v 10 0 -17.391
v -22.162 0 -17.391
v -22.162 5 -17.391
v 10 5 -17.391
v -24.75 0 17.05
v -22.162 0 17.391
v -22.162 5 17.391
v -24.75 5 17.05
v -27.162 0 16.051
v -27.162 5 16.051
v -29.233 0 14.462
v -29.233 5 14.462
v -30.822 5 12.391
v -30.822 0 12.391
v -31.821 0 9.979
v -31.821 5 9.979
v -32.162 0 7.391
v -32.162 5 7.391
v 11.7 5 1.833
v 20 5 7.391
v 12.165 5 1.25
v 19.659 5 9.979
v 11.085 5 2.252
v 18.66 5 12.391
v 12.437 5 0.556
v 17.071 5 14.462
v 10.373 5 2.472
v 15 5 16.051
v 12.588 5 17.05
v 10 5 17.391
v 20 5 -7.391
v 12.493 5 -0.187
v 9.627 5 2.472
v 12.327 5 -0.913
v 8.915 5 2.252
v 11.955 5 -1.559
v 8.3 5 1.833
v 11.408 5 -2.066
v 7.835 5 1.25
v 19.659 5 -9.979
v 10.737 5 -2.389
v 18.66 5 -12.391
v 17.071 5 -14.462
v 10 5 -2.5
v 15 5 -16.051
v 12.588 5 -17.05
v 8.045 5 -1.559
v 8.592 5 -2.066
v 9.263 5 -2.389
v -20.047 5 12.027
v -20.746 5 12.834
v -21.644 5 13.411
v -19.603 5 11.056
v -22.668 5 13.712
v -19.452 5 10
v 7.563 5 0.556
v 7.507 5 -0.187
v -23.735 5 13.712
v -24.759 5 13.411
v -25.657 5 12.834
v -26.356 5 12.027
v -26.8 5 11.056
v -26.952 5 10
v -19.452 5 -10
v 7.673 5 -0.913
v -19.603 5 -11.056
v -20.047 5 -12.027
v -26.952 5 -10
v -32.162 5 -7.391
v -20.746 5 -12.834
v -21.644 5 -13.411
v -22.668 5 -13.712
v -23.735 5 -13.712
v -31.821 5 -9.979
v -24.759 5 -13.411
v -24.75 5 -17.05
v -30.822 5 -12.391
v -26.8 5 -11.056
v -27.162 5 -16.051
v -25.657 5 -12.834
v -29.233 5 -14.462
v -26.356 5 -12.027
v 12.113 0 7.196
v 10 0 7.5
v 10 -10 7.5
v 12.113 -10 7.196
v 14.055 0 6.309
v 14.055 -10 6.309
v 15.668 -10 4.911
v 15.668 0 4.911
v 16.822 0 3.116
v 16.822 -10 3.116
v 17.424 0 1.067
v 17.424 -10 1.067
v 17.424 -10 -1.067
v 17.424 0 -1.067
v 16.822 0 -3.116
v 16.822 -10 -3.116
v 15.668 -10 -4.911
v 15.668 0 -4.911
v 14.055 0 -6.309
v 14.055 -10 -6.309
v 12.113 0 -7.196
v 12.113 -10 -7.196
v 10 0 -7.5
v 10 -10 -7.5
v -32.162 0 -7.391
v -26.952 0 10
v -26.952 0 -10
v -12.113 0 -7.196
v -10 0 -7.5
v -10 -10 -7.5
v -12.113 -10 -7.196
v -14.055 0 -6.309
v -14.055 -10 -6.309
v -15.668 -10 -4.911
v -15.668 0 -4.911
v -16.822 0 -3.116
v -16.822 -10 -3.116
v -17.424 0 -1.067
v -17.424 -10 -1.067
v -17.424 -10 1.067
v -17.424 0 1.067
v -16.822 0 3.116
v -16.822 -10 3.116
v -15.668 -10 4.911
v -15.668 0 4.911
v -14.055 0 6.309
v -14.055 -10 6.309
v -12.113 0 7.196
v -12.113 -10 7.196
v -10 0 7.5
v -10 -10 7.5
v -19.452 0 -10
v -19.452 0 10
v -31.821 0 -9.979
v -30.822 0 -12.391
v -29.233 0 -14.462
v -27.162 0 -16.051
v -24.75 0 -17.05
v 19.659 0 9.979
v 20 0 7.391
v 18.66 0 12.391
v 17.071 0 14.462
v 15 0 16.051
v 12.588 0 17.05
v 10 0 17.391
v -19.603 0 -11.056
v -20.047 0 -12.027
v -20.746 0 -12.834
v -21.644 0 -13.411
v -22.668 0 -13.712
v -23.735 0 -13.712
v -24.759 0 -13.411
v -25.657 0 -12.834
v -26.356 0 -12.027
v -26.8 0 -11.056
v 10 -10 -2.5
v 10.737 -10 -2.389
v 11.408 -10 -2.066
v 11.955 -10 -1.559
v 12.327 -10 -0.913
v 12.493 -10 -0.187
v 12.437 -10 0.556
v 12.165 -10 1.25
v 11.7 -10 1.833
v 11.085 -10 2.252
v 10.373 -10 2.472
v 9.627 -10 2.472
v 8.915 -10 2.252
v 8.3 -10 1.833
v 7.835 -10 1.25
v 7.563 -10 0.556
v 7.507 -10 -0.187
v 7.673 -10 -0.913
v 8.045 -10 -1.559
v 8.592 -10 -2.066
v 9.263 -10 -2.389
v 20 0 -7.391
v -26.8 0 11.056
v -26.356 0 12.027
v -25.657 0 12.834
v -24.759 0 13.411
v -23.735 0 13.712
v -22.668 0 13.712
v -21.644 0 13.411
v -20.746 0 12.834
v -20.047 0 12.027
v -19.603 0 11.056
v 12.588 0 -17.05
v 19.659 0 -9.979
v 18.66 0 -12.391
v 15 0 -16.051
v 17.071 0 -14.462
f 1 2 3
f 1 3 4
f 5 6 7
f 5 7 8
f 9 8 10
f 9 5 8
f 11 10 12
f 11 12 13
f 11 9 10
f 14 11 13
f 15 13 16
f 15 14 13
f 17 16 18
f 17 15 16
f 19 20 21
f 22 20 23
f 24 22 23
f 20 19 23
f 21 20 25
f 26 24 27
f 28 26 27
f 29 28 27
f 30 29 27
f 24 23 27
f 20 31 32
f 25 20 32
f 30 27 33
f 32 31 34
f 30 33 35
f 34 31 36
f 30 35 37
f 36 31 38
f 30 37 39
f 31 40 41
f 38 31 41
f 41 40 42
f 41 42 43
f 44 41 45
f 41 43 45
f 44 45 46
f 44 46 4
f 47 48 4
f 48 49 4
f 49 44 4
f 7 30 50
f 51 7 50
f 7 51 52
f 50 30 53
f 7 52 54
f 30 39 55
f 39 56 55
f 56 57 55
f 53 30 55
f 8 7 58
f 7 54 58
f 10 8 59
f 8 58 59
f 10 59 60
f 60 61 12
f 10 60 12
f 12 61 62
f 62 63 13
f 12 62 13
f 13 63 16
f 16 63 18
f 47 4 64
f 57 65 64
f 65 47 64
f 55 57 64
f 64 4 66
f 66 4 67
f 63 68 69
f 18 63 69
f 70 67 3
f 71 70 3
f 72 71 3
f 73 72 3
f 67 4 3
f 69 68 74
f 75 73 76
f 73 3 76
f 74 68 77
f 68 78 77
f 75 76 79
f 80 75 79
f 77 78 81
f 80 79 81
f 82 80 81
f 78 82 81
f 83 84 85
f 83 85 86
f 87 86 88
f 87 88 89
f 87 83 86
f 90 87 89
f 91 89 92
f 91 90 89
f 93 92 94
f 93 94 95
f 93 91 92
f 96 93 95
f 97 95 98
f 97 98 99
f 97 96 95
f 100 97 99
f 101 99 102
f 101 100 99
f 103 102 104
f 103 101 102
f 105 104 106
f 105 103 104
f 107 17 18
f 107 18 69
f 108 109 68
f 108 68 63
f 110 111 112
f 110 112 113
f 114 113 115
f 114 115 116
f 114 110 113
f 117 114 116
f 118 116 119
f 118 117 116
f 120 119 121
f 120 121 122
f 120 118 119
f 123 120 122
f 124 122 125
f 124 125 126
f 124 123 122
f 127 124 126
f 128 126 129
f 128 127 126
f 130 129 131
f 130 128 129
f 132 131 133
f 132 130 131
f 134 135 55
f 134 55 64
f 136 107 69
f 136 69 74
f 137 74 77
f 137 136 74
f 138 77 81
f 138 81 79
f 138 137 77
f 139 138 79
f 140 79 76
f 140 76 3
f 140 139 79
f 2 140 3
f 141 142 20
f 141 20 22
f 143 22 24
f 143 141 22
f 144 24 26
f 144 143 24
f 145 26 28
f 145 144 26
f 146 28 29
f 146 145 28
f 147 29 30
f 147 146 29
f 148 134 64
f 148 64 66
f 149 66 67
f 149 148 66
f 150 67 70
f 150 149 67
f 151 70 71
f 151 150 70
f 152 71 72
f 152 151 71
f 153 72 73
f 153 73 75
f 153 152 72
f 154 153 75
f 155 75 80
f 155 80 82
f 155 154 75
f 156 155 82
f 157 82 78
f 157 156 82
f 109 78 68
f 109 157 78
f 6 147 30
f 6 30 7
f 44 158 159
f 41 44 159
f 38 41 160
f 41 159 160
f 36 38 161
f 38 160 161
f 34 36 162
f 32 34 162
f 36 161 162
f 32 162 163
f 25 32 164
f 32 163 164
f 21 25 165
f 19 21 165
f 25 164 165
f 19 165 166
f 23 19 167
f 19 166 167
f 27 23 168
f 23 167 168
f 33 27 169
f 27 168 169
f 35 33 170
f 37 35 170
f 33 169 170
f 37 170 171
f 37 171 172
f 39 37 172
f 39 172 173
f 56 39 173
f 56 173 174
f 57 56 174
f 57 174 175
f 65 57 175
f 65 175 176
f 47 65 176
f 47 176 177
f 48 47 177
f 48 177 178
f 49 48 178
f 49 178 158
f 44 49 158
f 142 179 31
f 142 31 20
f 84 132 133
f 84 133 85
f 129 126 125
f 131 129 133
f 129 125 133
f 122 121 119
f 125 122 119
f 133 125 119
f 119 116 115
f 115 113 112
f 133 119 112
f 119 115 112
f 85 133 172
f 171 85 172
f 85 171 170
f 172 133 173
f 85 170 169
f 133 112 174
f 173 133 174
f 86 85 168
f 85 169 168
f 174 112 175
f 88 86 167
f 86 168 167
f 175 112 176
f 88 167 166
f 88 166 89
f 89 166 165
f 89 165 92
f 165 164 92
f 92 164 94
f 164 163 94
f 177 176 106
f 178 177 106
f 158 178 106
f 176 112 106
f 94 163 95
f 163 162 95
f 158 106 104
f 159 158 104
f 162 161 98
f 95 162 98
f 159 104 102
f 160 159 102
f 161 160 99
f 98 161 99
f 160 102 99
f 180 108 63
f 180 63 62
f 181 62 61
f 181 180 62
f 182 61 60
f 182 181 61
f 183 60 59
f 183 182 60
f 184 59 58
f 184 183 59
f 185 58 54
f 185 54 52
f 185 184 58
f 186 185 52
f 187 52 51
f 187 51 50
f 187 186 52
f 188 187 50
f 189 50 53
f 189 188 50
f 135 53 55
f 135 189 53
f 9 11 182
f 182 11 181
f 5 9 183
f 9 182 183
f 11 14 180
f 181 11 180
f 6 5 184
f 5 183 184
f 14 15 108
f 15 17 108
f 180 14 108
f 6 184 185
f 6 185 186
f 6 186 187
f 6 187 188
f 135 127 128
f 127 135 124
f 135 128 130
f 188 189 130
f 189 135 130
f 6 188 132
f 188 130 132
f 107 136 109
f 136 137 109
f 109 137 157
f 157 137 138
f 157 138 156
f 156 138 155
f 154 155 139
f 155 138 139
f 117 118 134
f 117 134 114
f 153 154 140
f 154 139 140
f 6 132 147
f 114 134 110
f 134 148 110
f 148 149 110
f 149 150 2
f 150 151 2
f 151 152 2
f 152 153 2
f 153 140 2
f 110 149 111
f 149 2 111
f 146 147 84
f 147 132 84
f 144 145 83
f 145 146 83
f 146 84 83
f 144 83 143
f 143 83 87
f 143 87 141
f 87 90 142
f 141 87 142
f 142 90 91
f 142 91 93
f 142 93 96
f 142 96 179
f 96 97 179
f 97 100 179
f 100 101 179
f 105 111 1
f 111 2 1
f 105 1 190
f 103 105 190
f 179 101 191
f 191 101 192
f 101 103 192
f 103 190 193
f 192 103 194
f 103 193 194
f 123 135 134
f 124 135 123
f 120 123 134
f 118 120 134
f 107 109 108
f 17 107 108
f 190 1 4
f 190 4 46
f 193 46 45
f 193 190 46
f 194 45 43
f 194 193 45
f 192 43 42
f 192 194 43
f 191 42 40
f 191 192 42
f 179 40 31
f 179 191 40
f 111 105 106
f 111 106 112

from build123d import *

# Parameters (mm, degrees)
BOSS_EXTRUDE1_DEPTH = 5
BOSS_EXTRUDE2_DEPTH = 10
SKETCH3_R           = 2.5
CUT_EXTRUDE1_DEPTH  = 16


with BuildPart() as part:
    # Sketch1 → Boss-Extrude1 (new body)
    with BuildSketch(Plane(origin=(0, 0, 0), x_dir=(1, 0, 0), z_dir=(0, 1, 0))):
        with BuildLine():
            ThreePointArc((-32.161548626, -7.391059627), (-29.232616438, -14.462127439), (-22.161548626, -17.391059627))
            Line((-22.161548626, -17.391059627), (10, -17.391059627))
            ThreePointArc((10, -17.391059627), (17.071067812, -14.462127439), (20, -7.391059627))
            Line((20, -7.391059627), (20, 7.391059627))
            ThreePointArc((20, 7.391059627), (17.071067812, 14.462127439), (10, 17.391059627))
            Line((10, 17.391059627), (-22.161548626, 17.391059627))
            ThreePointArc((-22.161548626, 17.391059627), (-29.232616438, 14.462127439), (-32.161548626, 7.391059627))
            Line((-32.161548626, 7.391059627), (-32.161548626, -7.391059627))
        make_face()
        with BuildLine():
            ThreePointArc((-26.951571496, 10), (-23.201571496, 13.75), (-19.451571496, 10))
            Line((-19.451571496, 10), (-19.451571496, -10))
            ThreePointArc((-19.451571496, -10), (-23.201571496, -13.75), (-26.951571496, -10))
            Line((-26.951571496, -10), (-26.951571496, 10))
        make_face(mode=Mode.SUBTRACT)
    extrude(amount=BOSS_EXTRUDE1_DEPTH)

    # Sketch1<3> → Boss-Extrude2 (add)
    with BuildSketch(Plane(origin=(0, 0, 0), x_dir=(1, 0, 0), z_dir=(0, 1, 0))):
        with BuildLine():
            Line((10, 7.5), (-10, 7.5))
            ThreePointArc((-10, 7.5), (-17.5, 0), (-10, -7.5))
            Line((-10, -7.5), (10, -7.5))
            ThreePointArc((10, -7.5), (17.5, 0), (10, 7.5))
        make_face()
    extrude(amount=-BOSS_EXTRUDE2_DEPTH)

    # Sketch3 → Cut-Extrude1 (cut)
    with BuildSketch(Plane.XZ.offset(10)):
        with Locations((10, 0)):
            Circle(SKETCH3_R)
    extrude(amount=-CUT_EXTRUDE1_DEPTH, mode=Mode.SUBTRACT)


solid = part.part
